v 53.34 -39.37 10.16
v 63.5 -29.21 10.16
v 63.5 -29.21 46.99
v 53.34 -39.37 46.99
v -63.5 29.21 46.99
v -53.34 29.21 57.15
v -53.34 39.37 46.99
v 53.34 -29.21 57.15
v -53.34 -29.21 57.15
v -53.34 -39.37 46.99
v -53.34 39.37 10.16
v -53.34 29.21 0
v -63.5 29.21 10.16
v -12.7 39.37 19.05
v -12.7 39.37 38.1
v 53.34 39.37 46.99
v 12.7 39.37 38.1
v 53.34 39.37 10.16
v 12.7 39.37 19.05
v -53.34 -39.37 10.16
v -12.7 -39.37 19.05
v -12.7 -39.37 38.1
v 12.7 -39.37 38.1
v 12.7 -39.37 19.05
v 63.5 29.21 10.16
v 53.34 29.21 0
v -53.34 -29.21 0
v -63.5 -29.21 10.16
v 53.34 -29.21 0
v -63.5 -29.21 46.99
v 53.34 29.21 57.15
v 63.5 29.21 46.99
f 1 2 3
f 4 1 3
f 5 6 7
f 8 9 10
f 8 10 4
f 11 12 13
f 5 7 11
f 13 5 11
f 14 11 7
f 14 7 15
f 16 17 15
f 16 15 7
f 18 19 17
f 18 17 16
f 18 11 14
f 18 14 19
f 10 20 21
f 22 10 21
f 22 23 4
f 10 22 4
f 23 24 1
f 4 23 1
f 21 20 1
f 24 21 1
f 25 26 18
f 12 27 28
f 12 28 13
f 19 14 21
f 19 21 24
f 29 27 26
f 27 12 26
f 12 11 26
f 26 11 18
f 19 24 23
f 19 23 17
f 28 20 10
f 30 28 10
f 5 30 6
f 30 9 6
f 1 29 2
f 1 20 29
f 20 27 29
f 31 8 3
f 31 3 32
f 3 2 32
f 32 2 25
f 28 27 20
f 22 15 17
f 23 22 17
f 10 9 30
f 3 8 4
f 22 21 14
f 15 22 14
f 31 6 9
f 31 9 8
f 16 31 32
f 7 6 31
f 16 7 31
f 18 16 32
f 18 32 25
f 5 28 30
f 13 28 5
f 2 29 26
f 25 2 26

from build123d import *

# Parameters (mm, degrees)
SKETCH1_W           = 127
SKETCH1_H           = 78.74
BOSS_EXTRUDE1_DEPTH = 19.05
SKETCH2_W           = 50.8
SKETCH2_H           = 78.74
BOSS_EXTRUDE2_DEPTH = 19.05
SKETCH3_W           = 127
SKETCH3_H           = 78.74
BOSS_EXTRUDE3_DEPTH = 19.05
CHAMFER1_SIZE       = 10.16


with BuildPart() as part:
    # Sketch1 → Boss-Extrude1 (new body)
    with BuildSketch(Plane.XY):
        Rectangle(SKETCH1_W, SKETCH1_H)
    extrude(amount=BOSS_EXTRUDE1_DEPTH)

    # Sketch2 → Boss-Extrude2 (add)
    with BuildSketch(Plane.XY.offset(19.05)):
        with Locations((-38.1, 0)):
            Rectangle(SKETCH2_W, SKETCH2_H)
        with Locations((38.1, 0)):
            Rectangle(SKETCH2_W, SKETCH2_H)
    extrude(amount=BOSS_EXTRUDE2_DEPTH)

    # Sketch3 → Boss-Extrude3 (add)
    with BuildSketch(Plane.XY.offset(38.1)):
        Rectangle(SKETCH3_W, SKETCH3_H)
    extrude(amount=BOSS_EXTRUDE3_DEPTH)

    # Chamfer1
    chamfer1_edges = [part.edges().sort_by_distance(p)[0] for p in [
        (-63.5, 0, 57.15),
        (0, -39.37, 57.15),
        (63.5, 0, 57.15),
        (0, 39.37, 57.15),
        (0, -39.37, 0),
        (-63.5, 0, 0),
        (0, 39.37, 0),
        (63.5, 0, 0),
        (63.5, -39.37, 28.575),
        (-63.5, -39.37, 28.575),
        (-63.5, 39.37, 28.575),
        (63.5, 39.37, 28.575),
    ]]
    chamfer(chamfer1_edges, length=CHAMFER1_SIZE)


solid = part.part
